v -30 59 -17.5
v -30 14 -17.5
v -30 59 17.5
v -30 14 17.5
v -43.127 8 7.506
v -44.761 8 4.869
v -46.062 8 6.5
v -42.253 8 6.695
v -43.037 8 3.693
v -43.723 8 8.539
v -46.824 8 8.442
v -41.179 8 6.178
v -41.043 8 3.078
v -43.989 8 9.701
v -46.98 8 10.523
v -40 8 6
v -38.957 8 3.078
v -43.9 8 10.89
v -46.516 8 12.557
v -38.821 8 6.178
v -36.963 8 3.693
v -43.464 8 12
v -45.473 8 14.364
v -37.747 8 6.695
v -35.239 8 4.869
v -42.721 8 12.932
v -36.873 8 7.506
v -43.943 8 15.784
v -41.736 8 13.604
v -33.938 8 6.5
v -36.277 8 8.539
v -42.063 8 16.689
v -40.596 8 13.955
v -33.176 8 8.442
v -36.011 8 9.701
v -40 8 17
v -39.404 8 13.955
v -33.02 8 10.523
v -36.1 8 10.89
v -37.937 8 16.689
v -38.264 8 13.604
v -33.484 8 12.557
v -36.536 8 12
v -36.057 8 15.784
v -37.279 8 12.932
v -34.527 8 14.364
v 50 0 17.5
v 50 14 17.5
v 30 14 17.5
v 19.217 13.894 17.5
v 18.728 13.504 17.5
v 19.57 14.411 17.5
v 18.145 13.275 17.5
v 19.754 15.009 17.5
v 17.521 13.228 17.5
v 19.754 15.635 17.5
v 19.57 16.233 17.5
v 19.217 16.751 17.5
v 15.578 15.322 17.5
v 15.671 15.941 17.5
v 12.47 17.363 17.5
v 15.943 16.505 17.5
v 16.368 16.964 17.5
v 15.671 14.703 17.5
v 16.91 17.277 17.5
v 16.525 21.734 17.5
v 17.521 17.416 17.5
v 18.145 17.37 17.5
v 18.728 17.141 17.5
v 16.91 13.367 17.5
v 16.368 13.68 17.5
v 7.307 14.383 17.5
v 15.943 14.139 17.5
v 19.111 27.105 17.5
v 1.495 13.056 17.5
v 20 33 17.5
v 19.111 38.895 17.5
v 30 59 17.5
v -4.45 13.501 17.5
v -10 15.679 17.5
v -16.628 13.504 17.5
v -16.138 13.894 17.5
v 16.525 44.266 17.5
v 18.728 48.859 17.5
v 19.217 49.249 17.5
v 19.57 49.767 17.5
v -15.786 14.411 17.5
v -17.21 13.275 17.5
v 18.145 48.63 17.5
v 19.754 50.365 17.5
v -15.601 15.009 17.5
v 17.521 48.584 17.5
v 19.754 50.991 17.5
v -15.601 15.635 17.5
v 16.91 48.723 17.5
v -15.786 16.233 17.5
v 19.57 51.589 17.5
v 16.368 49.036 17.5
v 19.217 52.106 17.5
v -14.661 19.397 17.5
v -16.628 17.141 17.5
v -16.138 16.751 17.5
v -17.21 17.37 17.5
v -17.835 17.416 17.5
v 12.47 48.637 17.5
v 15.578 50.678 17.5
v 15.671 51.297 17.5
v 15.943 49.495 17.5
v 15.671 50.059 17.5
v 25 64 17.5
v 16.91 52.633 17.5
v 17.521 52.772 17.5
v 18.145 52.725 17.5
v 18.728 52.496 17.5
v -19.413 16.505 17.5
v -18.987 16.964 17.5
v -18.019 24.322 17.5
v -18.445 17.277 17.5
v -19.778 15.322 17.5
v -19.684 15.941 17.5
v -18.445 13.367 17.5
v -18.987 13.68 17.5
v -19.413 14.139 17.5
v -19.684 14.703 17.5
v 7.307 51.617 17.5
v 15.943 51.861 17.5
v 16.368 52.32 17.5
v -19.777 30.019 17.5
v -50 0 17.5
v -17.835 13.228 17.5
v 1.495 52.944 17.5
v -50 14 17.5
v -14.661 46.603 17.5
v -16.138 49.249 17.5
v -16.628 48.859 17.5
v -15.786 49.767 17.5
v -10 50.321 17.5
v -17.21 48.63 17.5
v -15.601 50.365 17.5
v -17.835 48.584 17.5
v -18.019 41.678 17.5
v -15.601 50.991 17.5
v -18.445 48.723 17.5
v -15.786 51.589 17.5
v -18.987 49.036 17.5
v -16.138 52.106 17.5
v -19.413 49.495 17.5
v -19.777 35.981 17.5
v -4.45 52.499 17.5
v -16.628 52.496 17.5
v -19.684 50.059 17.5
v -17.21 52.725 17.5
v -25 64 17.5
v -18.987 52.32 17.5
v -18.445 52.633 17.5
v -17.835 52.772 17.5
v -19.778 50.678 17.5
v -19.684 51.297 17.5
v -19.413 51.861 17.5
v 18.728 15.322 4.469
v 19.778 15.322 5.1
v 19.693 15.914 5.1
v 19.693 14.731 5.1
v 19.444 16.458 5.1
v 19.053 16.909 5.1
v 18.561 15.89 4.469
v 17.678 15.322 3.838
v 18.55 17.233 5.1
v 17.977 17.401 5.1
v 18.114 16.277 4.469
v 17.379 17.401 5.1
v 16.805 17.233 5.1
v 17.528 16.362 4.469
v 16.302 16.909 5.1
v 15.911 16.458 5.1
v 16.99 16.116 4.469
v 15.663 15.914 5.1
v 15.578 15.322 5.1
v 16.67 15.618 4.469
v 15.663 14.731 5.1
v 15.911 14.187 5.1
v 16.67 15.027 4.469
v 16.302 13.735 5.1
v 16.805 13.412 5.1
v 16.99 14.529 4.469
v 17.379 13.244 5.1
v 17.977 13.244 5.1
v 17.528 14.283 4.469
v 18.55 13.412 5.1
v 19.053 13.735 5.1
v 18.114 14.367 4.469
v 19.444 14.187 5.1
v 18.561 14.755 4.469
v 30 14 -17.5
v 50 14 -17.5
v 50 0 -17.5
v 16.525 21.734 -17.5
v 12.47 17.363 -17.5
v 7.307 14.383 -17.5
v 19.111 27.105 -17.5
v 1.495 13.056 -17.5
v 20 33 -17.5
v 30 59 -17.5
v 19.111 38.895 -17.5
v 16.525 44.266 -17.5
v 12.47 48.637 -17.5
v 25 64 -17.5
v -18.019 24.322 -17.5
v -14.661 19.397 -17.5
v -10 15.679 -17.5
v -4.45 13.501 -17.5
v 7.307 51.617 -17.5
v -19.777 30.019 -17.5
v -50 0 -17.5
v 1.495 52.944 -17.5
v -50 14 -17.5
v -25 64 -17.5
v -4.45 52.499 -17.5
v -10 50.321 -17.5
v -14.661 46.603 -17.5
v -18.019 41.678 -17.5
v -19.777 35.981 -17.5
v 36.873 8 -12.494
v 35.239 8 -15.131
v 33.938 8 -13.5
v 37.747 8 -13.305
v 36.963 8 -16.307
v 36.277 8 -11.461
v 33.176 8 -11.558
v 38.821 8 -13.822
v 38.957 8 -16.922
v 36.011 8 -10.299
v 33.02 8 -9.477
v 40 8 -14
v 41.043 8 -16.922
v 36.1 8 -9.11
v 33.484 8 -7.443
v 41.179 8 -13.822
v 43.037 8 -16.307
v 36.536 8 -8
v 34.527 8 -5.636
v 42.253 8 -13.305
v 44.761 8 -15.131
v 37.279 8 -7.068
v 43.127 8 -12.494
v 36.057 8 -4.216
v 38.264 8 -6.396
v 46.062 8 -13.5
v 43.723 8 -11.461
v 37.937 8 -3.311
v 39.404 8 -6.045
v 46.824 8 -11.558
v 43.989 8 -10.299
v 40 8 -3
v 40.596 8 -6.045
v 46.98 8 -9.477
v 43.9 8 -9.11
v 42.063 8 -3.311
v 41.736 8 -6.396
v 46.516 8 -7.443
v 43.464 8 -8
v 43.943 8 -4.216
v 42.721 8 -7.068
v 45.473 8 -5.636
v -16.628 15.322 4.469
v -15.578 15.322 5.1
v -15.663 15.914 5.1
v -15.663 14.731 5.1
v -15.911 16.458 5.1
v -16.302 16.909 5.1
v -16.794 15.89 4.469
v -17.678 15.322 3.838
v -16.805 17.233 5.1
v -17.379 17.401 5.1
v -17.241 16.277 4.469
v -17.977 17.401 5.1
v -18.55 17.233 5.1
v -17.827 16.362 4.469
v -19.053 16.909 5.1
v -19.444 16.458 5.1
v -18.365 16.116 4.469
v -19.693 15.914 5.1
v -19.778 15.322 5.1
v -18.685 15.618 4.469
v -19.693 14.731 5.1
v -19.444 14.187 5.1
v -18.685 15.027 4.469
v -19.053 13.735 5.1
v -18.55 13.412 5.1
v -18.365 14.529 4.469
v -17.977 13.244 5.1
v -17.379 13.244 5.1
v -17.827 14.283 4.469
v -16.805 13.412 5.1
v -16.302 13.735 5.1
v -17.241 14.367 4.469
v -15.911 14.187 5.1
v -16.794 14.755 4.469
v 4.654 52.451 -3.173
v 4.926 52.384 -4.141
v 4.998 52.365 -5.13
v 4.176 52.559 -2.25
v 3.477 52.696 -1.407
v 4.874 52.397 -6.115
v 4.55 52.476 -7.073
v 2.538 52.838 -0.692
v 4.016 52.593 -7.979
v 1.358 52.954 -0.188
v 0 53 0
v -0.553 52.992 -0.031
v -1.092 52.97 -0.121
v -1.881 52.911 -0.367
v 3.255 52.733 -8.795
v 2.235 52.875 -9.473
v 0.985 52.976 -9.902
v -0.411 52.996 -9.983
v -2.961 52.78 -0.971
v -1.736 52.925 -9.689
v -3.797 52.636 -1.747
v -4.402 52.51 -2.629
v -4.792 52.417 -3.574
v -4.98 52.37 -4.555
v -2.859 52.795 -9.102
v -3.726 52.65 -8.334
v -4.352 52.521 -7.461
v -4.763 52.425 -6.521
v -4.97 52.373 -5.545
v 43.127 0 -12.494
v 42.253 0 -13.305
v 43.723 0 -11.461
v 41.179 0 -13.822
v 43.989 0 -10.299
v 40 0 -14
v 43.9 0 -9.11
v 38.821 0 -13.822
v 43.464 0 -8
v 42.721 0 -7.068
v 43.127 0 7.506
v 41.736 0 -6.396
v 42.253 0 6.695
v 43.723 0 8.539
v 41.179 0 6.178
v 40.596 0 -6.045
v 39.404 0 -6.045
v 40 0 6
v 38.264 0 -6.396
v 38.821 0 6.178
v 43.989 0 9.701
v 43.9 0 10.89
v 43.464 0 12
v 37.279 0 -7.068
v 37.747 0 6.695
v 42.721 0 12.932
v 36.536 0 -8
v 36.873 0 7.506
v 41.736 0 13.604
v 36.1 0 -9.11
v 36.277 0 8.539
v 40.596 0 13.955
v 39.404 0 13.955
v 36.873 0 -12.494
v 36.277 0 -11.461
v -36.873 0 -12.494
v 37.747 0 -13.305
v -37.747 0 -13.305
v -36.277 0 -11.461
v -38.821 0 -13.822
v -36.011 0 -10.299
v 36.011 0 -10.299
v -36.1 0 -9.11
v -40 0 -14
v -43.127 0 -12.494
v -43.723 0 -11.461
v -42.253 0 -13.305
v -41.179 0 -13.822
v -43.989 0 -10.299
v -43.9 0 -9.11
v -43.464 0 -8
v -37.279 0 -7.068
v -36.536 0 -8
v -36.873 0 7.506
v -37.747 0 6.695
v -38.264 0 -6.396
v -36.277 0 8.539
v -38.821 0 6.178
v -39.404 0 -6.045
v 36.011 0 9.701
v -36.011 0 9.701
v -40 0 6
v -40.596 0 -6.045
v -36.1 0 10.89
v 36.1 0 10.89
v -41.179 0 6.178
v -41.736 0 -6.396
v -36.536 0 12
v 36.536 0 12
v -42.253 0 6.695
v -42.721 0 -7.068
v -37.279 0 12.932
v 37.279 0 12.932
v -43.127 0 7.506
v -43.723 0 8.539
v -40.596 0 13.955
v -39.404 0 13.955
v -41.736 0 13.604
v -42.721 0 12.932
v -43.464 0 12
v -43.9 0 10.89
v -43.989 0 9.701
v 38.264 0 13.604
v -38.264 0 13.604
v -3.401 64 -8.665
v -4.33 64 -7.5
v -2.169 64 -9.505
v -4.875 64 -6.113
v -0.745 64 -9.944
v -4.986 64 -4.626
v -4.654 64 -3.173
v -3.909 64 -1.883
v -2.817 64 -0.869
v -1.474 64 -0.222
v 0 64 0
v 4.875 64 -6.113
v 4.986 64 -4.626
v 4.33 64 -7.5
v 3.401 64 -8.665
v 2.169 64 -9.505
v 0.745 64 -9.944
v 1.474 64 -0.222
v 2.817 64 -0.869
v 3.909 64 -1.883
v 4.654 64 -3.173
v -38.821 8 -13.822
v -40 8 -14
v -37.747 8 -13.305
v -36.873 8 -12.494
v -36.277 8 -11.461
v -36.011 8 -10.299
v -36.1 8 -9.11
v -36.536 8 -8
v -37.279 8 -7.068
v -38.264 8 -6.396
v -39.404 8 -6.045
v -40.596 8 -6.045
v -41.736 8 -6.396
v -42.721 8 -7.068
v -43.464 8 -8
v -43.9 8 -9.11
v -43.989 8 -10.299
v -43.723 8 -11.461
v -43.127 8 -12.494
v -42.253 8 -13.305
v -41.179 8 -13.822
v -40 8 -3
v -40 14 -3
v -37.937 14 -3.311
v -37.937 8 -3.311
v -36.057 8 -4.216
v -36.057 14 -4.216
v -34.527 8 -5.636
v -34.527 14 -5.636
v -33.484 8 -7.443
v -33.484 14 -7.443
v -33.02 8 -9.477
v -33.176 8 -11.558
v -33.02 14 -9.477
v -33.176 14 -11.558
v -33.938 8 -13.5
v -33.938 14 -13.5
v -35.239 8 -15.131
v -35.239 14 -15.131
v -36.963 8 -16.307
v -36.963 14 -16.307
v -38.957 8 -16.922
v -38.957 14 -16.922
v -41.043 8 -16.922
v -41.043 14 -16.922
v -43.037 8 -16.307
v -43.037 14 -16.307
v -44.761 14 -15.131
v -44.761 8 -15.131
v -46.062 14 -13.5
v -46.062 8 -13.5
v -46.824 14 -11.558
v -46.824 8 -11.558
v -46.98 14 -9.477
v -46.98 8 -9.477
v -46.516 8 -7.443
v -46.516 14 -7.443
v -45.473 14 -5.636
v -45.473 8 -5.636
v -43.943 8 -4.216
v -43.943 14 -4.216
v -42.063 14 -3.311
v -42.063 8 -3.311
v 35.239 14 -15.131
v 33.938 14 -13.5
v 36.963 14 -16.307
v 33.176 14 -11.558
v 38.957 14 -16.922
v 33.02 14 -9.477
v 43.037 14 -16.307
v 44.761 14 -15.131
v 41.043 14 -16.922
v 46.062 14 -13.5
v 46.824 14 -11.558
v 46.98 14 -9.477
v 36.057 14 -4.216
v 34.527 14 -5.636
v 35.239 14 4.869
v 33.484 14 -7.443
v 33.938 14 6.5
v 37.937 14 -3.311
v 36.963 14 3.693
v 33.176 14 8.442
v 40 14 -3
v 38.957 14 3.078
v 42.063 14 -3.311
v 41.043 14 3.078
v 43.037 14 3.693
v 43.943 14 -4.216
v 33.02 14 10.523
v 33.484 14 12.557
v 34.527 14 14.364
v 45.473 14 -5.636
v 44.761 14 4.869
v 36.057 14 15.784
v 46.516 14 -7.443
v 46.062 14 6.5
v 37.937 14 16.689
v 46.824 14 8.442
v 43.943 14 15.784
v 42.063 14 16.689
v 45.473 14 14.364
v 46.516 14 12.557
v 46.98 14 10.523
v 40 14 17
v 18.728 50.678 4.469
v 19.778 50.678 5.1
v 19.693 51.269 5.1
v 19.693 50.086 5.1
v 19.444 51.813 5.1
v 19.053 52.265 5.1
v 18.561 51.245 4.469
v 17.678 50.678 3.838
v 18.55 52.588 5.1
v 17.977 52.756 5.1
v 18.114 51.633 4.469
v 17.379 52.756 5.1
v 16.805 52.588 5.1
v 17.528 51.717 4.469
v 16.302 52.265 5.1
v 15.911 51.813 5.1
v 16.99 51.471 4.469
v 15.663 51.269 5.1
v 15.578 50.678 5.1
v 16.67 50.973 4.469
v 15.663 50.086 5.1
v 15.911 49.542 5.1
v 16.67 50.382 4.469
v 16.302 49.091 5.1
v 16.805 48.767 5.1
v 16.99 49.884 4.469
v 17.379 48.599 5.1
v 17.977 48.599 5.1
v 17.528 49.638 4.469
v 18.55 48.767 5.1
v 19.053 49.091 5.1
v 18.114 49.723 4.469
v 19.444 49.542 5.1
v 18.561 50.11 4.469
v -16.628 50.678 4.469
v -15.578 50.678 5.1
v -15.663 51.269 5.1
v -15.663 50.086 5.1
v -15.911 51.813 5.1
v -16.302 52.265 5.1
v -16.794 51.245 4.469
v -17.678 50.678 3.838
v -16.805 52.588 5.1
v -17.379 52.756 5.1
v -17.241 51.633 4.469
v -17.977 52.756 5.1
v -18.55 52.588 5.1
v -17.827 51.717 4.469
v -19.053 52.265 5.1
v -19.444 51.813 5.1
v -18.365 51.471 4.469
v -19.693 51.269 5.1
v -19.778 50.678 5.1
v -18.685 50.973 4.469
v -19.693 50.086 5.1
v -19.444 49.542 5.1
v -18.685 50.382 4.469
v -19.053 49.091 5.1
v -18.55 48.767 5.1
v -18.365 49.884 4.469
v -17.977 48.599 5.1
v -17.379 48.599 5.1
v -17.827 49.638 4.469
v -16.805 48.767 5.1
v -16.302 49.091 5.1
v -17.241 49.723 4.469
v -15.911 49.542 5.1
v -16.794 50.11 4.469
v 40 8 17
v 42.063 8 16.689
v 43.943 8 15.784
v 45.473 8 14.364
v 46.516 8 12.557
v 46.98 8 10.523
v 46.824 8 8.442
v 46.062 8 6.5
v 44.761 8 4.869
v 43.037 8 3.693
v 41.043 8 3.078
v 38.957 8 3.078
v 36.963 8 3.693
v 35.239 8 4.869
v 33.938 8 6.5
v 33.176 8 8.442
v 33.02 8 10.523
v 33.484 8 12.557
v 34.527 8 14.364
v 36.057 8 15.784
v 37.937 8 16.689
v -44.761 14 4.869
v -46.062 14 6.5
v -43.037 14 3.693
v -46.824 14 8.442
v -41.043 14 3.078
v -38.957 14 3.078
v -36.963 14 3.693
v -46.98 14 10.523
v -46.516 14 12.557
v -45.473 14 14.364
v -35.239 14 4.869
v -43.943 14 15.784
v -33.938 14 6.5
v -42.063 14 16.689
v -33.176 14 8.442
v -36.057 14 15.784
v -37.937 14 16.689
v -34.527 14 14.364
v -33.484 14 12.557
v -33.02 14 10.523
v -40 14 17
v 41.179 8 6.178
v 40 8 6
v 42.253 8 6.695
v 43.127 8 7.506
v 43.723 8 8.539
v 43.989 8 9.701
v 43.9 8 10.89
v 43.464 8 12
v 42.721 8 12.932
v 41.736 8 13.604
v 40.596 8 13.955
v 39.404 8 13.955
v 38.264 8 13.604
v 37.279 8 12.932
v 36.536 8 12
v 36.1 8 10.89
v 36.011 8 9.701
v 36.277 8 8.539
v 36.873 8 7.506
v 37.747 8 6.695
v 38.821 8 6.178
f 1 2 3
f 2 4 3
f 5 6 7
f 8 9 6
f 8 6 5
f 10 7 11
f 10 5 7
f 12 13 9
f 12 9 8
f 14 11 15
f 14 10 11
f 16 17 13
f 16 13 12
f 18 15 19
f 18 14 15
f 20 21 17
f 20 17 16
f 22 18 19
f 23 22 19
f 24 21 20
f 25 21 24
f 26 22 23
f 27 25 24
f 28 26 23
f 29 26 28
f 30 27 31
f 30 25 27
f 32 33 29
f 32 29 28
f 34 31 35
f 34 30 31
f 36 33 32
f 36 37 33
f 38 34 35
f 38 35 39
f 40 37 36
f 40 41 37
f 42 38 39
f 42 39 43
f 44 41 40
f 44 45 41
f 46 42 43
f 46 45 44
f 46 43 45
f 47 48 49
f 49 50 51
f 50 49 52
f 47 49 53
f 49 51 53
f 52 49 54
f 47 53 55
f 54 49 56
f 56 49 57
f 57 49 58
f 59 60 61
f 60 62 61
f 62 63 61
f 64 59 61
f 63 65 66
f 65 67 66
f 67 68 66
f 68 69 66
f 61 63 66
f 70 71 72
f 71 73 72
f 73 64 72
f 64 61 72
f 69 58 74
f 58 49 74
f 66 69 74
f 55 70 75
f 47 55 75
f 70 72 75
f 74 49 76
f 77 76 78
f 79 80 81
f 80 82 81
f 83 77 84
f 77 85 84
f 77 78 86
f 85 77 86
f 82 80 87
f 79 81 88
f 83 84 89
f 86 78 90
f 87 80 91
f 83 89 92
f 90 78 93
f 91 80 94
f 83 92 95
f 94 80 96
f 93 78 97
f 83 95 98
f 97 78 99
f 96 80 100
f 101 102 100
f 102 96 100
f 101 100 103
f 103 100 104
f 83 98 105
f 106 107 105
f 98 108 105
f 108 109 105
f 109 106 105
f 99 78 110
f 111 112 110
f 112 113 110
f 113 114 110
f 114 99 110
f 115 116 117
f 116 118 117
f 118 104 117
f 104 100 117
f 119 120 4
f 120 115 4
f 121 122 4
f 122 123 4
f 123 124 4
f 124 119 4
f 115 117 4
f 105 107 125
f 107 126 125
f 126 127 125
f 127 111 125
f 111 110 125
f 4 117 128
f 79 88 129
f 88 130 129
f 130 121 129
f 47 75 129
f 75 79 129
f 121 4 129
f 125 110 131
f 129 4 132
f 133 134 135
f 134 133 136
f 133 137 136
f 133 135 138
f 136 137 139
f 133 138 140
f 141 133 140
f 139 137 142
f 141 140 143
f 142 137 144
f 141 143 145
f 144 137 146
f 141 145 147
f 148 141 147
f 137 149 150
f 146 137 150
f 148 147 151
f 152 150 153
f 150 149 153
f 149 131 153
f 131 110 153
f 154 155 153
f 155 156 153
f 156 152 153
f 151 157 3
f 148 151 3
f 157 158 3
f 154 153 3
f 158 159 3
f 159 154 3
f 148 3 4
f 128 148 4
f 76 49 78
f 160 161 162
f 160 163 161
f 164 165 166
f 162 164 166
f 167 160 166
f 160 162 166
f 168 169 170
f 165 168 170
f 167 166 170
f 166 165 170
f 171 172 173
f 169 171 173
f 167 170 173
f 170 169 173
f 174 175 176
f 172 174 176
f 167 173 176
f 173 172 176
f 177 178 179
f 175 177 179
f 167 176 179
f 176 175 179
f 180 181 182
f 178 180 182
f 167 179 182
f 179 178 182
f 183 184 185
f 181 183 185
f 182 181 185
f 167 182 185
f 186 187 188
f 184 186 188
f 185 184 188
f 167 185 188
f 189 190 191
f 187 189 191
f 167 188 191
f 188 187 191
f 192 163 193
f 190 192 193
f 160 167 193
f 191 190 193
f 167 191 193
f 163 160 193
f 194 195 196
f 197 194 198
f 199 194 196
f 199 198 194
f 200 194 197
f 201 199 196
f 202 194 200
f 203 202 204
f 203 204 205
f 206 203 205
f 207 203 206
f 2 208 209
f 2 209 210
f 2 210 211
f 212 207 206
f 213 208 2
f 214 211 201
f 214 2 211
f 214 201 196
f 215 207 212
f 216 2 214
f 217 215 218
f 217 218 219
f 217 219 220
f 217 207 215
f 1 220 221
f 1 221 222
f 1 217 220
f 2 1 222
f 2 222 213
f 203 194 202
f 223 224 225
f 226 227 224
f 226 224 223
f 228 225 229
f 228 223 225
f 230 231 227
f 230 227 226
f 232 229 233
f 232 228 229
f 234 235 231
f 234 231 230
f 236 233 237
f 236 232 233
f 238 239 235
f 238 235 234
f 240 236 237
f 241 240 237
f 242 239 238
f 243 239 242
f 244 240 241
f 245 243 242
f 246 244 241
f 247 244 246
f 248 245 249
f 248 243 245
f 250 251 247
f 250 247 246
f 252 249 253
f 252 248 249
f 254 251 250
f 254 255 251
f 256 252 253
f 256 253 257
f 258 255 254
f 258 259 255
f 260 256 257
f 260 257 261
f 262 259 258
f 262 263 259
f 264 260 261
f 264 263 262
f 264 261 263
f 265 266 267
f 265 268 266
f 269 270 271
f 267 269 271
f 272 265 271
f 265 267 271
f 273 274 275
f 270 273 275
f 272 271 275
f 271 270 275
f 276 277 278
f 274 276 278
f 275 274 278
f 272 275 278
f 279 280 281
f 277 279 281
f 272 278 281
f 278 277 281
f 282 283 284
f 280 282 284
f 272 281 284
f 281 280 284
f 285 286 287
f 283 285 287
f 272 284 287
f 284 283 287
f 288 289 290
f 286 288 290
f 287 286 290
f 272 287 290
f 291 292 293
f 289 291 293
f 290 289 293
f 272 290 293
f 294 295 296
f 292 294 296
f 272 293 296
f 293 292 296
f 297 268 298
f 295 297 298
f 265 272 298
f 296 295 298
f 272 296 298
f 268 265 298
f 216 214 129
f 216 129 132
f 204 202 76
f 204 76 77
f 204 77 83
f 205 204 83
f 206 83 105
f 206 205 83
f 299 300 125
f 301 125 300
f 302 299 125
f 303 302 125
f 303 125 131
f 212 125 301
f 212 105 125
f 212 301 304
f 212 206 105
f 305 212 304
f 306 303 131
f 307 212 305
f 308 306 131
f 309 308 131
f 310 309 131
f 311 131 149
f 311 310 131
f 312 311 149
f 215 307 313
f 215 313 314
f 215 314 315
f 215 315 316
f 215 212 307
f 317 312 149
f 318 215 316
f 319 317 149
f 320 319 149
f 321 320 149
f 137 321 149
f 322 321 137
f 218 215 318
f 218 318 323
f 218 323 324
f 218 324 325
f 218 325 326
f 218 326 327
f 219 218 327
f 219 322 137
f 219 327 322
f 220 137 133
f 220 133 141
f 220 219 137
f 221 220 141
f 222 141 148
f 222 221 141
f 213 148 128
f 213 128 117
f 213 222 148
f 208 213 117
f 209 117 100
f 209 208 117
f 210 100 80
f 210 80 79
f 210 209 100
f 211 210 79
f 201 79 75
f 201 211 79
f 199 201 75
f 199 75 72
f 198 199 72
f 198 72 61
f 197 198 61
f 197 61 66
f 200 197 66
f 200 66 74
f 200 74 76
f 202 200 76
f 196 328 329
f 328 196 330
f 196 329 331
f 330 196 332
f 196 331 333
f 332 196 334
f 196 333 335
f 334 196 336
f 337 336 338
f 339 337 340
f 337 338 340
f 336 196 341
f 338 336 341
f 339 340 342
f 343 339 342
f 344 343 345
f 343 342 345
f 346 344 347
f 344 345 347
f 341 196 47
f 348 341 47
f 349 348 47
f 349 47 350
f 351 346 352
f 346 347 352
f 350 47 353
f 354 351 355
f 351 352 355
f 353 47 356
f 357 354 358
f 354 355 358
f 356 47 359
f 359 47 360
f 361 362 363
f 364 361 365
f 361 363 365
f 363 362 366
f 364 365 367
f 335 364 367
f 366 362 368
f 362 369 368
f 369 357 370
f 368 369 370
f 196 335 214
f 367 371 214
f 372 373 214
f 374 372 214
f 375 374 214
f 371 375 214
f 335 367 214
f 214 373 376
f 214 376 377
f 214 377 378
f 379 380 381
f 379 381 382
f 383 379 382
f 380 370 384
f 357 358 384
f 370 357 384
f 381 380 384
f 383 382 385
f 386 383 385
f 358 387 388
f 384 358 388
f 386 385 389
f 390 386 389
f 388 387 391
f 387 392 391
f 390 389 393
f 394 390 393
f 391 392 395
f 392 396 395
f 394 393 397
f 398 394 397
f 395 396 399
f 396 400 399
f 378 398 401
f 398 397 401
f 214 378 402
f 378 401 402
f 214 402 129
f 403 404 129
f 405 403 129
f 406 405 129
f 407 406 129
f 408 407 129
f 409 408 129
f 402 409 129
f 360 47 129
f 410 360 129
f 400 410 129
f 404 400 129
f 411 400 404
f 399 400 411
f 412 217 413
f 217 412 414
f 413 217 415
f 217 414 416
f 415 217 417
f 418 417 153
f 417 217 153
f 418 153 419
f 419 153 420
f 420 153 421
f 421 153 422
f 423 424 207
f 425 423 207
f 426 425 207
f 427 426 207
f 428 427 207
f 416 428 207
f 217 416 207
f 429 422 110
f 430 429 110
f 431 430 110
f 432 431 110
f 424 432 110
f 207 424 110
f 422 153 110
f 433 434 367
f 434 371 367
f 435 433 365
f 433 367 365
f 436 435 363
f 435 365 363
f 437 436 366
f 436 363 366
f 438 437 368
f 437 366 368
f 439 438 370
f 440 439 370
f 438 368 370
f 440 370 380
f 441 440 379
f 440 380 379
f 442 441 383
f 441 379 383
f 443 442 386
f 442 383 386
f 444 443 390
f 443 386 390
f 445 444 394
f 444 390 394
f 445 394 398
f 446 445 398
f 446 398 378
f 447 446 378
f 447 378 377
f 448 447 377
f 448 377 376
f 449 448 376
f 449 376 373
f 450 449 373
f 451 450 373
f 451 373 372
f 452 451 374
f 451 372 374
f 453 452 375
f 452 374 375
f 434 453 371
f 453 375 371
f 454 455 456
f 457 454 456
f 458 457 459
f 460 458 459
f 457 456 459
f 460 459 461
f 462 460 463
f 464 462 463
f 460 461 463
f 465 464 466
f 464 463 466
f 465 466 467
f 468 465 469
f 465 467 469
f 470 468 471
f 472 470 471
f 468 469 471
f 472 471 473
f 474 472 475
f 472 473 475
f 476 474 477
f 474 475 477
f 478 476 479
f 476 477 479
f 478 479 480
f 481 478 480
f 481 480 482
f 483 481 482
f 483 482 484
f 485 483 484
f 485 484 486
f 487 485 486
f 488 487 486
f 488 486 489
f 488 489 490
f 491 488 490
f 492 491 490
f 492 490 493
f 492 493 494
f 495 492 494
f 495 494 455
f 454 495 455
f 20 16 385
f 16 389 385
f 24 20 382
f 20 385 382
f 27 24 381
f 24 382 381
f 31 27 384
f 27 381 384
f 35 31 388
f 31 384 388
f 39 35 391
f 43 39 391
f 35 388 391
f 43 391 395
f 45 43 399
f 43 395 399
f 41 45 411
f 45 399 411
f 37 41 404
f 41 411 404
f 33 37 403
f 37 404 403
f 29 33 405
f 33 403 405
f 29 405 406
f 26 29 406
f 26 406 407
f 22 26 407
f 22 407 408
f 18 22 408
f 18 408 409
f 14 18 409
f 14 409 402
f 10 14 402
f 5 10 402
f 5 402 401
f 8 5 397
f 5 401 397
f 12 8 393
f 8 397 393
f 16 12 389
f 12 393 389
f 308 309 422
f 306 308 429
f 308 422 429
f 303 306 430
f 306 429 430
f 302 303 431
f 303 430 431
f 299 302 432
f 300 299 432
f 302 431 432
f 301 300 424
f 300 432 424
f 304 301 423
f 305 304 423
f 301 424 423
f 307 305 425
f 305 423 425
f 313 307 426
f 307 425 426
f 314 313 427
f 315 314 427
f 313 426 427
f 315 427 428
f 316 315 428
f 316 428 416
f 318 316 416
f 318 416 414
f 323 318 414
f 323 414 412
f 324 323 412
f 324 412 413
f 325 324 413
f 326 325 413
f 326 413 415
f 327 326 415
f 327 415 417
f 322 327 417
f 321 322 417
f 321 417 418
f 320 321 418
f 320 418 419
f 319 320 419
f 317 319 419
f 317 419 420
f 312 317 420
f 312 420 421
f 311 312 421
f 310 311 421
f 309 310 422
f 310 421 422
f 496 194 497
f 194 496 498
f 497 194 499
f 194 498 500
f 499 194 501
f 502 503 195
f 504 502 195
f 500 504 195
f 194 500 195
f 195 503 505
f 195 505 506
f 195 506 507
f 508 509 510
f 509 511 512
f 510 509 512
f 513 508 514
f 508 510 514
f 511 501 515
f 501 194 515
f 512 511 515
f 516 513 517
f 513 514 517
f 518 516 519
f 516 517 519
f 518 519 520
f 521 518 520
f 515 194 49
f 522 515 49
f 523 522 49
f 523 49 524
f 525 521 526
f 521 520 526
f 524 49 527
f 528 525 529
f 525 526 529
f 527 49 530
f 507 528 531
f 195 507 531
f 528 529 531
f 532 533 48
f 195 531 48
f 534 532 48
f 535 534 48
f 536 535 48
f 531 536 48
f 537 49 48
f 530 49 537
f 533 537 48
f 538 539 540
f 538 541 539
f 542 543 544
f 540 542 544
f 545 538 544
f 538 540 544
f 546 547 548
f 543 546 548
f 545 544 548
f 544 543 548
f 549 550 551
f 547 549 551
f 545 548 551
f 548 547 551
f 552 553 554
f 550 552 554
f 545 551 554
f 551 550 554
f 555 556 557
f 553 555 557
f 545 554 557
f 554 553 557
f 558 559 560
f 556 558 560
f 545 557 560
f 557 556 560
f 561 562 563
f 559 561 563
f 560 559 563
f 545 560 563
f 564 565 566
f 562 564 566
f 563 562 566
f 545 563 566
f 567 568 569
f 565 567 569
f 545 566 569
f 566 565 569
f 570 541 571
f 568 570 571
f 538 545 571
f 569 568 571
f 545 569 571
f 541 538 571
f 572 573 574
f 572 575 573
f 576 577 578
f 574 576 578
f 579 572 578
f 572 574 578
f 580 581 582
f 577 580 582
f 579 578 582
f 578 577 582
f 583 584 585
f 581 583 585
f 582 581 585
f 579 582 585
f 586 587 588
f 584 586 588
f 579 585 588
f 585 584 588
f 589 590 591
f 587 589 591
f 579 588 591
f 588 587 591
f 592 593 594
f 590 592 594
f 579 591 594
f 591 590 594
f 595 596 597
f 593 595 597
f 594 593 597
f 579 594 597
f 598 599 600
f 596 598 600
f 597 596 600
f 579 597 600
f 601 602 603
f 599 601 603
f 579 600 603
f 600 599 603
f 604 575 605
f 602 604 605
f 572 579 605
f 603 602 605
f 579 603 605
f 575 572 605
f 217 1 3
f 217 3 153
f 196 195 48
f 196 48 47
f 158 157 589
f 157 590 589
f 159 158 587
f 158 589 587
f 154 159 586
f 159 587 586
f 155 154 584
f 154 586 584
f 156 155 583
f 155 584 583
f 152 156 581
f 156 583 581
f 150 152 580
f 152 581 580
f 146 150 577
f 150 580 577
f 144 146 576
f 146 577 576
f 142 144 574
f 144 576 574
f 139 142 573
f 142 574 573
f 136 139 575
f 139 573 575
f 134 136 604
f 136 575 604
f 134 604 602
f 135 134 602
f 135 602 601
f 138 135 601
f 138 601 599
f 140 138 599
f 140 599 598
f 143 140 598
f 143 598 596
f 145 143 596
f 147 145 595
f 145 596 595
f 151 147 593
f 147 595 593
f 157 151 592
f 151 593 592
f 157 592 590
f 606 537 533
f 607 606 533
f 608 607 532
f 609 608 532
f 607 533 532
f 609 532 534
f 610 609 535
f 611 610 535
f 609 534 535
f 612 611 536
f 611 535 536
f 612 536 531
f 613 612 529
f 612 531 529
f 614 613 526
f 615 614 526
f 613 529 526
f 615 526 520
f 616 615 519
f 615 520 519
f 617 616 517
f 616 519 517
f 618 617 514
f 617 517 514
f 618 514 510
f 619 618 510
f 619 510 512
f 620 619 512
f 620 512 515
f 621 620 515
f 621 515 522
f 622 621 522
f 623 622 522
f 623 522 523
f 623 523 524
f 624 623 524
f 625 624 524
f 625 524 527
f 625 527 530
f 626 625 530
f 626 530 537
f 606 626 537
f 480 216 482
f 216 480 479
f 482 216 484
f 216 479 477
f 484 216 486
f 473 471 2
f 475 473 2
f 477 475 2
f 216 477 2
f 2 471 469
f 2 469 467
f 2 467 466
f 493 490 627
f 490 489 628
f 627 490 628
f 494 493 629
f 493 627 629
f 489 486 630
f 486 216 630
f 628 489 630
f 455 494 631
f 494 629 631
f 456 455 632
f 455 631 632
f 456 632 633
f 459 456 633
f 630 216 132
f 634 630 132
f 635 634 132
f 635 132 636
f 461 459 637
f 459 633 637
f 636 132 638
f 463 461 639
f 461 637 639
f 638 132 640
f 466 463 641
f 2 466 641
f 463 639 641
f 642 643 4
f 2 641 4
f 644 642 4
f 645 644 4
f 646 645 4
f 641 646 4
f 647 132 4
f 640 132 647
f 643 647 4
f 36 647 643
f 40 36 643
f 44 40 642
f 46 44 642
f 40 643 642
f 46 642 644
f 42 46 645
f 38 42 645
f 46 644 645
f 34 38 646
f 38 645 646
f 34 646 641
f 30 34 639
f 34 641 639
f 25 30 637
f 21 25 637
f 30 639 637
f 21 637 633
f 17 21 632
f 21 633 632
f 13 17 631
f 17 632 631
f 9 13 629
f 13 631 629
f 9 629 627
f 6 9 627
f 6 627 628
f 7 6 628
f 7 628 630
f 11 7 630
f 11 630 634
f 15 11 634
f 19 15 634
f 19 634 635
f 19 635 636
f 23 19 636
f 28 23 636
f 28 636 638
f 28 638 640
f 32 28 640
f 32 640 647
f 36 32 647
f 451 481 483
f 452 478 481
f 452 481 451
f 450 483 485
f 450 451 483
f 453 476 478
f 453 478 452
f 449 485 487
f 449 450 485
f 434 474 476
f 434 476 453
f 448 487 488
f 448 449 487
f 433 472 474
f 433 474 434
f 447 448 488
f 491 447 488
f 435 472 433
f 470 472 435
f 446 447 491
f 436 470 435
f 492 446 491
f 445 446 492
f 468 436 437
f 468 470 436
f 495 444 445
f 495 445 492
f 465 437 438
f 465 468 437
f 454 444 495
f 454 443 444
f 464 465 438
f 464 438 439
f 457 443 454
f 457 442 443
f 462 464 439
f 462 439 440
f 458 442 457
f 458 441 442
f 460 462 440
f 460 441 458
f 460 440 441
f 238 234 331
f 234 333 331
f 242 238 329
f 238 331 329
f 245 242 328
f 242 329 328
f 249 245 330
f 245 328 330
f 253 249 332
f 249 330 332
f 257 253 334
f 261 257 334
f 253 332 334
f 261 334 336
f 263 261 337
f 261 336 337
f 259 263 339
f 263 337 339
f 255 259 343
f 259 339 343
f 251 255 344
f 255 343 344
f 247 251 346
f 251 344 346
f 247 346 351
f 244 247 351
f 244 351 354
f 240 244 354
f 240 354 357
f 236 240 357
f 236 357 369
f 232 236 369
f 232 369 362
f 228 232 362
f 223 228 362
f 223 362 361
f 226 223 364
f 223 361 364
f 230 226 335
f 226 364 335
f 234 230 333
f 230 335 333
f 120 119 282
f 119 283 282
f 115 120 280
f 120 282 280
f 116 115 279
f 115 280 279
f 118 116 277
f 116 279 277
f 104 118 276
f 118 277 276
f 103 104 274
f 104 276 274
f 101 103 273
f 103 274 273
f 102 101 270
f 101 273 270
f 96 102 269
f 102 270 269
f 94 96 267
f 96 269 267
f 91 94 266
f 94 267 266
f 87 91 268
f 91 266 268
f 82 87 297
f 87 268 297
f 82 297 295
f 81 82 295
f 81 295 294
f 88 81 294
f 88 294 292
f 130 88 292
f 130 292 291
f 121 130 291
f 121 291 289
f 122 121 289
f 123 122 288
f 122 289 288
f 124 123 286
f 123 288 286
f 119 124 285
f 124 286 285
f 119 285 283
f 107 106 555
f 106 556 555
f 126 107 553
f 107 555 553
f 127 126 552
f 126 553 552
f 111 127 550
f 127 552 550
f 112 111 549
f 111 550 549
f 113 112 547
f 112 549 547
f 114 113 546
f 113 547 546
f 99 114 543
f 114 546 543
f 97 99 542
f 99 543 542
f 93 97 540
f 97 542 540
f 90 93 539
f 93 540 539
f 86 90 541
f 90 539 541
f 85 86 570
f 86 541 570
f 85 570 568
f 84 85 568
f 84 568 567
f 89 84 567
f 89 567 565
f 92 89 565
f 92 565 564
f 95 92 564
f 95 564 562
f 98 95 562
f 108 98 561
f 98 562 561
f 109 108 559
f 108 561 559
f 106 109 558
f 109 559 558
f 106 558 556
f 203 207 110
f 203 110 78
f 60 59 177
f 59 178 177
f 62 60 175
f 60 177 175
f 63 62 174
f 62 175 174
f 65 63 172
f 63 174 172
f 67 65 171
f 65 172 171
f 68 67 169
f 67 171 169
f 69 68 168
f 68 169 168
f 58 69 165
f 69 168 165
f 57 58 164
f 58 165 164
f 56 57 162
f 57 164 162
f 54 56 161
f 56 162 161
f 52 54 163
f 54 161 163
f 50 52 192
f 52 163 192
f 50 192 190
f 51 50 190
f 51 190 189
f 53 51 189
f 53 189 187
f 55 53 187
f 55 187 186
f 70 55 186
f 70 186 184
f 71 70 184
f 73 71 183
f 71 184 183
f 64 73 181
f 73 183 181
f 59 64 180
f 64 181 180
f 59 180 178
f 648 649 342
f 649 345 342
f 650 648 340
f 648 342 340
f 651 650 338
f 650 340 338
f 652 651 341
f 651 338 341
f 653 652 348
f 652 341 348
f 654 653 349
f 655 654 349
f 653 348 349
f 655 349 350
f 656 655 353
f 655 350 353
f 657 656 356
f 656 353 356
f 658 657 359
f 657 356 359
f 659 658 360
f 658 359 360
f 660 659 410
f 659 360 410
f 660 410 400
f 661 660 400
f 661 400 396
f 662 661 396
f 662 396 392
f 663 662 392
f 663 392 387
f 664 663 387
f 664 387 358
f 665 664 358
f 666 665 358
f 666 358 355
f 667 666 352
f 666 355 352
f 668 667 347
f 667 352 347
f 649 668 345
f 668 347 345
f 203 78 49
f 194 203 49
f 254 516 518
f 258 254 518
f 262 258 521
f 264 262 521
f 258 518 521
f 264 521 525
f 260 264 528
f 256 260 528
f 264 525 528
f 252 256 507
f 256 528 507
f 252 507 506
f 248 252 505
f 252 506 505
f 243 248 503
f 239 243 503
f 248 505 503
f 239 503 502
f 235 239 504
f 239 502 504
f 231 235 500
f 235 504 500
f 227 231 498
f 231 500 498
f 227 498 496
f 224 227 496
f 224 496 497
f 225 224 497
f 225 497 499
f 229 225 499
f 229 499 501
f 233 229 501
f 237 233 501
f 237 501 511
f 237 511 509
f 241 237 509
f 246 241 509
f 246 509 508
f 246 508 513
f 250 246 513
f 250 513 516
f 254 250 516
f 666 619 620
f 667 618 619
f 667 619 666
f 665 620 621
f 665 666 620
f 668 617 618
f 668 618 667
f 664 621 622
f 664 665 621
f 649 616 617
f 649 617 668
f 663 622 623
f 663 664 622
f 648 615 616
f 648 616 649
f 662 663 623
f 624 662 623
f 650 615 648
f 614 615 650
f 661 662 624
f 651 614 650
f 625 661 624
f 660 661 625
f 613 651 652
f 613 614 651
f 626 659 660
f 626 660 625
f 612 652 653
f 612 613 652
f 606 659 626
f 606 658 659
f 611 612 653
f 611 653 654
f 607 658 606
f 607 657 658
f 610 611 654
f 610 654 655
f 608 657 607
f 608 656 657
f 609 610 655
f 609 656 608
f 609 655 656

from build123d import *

# Parameters (mm, degrees)
SKETCH_1_R                   = 20
EXTRUDE_1_DEPTH              = 17.5
HOLE_WIZARD_M6_1_D           = 8
HOLE_WIZARD_M6_1_CBORE_D     = 14
HOLE_WIZARD_M6_1_CBORE_DEPTH = 6
HOLE_WIZARD_M5_1_D           = 4.2
HOLE_WIZARD_M5_1_DEPTH       = 12.4
HOLE_WIZARD_M5_1_TIP         = 1.2618073
CUT_EXTRUDE_2_REACH          = 85.08
CUT_EXTRUDE_2_END_RADIUS     = 20
SKETCH_5_R                   = 5


with BuildPart() as part:
    # 草图1 → 拉伸1 (new, symmetric)
    with BuildSketch(Plane.XY):
        Polygon((30, 14), (50, 14), (50, 0), (-50, 0), (-50, 14), (-30, 14), (-30, 59), (-25, 64), (25, 64), (30, 59), align=None)
        with Locations((0, 33)):
            Circle(SKETCH_1_R, mode=Mode.SUBTRACT)
    extrude(amount=EXTRUDE_1_DEPTH, both=True)

    # M6 六角凹头螺钉的柱形沉头孔1 (through all)
    with Locations(Plane(origin=(-40, 14, 10), x_dir=(0, 0, 1), z_dir=(0, 1, 0))):
        with Locations((0, 0), (-20, 0), (-20, 80), (0, 80)):
            CounterBoreHole(HOLE_WIZARD_M6_1_D / 2, HOLE_WIZARD_M6_1_CBORE_D / 2, HOLE_WIZARD_M6_1_CBORE_DEPTH)

    # M5 螺纹孔1
    with Locations(Plane(origin=(-17.67766953, 15.32233047, 17.5), x_dir=(1, 0, 0), z_dir=(0, 0, 1))):
        with Locations((0, 0), (35.35533906, 0), (35.35533906, 35.35533906), (0, 35.35533906)):
            Hole(HOLE_WIZARD_M5_1_D / 2, depth=HOLE_WIZARD_M5_1_DEPTH)
            with Locations((0, 0, -(HOLE_WIZARD_M5_1_DEPTH + HOLE_WIZARD_M5_1_TIP / 2))):  # 118° drill point
                Cone(0, HOLE_WIZARD_M5_1_D / 2, HOLE_WIZARD_M5_1_TIP, mode=Mode.SUBTRACT)

    # 拉伸2: up to this cylinder (the profile starts outside it)
    cut_extrude_2_end = Plane(origin=(0, 33, -5), z_dir=(0, 0, -1)) * Cylinder(CUT_EXTRUDE_2_END_RADIUS, 211.16, mode=Mode.PRIVATE)
    # 草图5 → 拉伸2 (cut, up to the surface)
    with BuildSketch(Plane(origin=(0, 64, 0), x_dir=(1, 0, 0), z_dir=(0, 1, 0)), mode=Mode.PRIVATE) as cut_extrude_2_sk1:
        with Locations(Location((0, 5, 0), (0, 0, 270))):
            Circle(SKETCH_5_R)
    cut_extrude_2_tool1 = extrude(cut_extrude_2_sk1.sketch, amount=-CUT_EXTRUDE_2_REACH, mode=Mode.PRIVATE) - cut_extrude_2_end
    add(cut_extrude_2_tool1.solids().sort_by_distance((0, 64, -5))[0], mode=Mode.SUBTRACT)


solid = part.part
